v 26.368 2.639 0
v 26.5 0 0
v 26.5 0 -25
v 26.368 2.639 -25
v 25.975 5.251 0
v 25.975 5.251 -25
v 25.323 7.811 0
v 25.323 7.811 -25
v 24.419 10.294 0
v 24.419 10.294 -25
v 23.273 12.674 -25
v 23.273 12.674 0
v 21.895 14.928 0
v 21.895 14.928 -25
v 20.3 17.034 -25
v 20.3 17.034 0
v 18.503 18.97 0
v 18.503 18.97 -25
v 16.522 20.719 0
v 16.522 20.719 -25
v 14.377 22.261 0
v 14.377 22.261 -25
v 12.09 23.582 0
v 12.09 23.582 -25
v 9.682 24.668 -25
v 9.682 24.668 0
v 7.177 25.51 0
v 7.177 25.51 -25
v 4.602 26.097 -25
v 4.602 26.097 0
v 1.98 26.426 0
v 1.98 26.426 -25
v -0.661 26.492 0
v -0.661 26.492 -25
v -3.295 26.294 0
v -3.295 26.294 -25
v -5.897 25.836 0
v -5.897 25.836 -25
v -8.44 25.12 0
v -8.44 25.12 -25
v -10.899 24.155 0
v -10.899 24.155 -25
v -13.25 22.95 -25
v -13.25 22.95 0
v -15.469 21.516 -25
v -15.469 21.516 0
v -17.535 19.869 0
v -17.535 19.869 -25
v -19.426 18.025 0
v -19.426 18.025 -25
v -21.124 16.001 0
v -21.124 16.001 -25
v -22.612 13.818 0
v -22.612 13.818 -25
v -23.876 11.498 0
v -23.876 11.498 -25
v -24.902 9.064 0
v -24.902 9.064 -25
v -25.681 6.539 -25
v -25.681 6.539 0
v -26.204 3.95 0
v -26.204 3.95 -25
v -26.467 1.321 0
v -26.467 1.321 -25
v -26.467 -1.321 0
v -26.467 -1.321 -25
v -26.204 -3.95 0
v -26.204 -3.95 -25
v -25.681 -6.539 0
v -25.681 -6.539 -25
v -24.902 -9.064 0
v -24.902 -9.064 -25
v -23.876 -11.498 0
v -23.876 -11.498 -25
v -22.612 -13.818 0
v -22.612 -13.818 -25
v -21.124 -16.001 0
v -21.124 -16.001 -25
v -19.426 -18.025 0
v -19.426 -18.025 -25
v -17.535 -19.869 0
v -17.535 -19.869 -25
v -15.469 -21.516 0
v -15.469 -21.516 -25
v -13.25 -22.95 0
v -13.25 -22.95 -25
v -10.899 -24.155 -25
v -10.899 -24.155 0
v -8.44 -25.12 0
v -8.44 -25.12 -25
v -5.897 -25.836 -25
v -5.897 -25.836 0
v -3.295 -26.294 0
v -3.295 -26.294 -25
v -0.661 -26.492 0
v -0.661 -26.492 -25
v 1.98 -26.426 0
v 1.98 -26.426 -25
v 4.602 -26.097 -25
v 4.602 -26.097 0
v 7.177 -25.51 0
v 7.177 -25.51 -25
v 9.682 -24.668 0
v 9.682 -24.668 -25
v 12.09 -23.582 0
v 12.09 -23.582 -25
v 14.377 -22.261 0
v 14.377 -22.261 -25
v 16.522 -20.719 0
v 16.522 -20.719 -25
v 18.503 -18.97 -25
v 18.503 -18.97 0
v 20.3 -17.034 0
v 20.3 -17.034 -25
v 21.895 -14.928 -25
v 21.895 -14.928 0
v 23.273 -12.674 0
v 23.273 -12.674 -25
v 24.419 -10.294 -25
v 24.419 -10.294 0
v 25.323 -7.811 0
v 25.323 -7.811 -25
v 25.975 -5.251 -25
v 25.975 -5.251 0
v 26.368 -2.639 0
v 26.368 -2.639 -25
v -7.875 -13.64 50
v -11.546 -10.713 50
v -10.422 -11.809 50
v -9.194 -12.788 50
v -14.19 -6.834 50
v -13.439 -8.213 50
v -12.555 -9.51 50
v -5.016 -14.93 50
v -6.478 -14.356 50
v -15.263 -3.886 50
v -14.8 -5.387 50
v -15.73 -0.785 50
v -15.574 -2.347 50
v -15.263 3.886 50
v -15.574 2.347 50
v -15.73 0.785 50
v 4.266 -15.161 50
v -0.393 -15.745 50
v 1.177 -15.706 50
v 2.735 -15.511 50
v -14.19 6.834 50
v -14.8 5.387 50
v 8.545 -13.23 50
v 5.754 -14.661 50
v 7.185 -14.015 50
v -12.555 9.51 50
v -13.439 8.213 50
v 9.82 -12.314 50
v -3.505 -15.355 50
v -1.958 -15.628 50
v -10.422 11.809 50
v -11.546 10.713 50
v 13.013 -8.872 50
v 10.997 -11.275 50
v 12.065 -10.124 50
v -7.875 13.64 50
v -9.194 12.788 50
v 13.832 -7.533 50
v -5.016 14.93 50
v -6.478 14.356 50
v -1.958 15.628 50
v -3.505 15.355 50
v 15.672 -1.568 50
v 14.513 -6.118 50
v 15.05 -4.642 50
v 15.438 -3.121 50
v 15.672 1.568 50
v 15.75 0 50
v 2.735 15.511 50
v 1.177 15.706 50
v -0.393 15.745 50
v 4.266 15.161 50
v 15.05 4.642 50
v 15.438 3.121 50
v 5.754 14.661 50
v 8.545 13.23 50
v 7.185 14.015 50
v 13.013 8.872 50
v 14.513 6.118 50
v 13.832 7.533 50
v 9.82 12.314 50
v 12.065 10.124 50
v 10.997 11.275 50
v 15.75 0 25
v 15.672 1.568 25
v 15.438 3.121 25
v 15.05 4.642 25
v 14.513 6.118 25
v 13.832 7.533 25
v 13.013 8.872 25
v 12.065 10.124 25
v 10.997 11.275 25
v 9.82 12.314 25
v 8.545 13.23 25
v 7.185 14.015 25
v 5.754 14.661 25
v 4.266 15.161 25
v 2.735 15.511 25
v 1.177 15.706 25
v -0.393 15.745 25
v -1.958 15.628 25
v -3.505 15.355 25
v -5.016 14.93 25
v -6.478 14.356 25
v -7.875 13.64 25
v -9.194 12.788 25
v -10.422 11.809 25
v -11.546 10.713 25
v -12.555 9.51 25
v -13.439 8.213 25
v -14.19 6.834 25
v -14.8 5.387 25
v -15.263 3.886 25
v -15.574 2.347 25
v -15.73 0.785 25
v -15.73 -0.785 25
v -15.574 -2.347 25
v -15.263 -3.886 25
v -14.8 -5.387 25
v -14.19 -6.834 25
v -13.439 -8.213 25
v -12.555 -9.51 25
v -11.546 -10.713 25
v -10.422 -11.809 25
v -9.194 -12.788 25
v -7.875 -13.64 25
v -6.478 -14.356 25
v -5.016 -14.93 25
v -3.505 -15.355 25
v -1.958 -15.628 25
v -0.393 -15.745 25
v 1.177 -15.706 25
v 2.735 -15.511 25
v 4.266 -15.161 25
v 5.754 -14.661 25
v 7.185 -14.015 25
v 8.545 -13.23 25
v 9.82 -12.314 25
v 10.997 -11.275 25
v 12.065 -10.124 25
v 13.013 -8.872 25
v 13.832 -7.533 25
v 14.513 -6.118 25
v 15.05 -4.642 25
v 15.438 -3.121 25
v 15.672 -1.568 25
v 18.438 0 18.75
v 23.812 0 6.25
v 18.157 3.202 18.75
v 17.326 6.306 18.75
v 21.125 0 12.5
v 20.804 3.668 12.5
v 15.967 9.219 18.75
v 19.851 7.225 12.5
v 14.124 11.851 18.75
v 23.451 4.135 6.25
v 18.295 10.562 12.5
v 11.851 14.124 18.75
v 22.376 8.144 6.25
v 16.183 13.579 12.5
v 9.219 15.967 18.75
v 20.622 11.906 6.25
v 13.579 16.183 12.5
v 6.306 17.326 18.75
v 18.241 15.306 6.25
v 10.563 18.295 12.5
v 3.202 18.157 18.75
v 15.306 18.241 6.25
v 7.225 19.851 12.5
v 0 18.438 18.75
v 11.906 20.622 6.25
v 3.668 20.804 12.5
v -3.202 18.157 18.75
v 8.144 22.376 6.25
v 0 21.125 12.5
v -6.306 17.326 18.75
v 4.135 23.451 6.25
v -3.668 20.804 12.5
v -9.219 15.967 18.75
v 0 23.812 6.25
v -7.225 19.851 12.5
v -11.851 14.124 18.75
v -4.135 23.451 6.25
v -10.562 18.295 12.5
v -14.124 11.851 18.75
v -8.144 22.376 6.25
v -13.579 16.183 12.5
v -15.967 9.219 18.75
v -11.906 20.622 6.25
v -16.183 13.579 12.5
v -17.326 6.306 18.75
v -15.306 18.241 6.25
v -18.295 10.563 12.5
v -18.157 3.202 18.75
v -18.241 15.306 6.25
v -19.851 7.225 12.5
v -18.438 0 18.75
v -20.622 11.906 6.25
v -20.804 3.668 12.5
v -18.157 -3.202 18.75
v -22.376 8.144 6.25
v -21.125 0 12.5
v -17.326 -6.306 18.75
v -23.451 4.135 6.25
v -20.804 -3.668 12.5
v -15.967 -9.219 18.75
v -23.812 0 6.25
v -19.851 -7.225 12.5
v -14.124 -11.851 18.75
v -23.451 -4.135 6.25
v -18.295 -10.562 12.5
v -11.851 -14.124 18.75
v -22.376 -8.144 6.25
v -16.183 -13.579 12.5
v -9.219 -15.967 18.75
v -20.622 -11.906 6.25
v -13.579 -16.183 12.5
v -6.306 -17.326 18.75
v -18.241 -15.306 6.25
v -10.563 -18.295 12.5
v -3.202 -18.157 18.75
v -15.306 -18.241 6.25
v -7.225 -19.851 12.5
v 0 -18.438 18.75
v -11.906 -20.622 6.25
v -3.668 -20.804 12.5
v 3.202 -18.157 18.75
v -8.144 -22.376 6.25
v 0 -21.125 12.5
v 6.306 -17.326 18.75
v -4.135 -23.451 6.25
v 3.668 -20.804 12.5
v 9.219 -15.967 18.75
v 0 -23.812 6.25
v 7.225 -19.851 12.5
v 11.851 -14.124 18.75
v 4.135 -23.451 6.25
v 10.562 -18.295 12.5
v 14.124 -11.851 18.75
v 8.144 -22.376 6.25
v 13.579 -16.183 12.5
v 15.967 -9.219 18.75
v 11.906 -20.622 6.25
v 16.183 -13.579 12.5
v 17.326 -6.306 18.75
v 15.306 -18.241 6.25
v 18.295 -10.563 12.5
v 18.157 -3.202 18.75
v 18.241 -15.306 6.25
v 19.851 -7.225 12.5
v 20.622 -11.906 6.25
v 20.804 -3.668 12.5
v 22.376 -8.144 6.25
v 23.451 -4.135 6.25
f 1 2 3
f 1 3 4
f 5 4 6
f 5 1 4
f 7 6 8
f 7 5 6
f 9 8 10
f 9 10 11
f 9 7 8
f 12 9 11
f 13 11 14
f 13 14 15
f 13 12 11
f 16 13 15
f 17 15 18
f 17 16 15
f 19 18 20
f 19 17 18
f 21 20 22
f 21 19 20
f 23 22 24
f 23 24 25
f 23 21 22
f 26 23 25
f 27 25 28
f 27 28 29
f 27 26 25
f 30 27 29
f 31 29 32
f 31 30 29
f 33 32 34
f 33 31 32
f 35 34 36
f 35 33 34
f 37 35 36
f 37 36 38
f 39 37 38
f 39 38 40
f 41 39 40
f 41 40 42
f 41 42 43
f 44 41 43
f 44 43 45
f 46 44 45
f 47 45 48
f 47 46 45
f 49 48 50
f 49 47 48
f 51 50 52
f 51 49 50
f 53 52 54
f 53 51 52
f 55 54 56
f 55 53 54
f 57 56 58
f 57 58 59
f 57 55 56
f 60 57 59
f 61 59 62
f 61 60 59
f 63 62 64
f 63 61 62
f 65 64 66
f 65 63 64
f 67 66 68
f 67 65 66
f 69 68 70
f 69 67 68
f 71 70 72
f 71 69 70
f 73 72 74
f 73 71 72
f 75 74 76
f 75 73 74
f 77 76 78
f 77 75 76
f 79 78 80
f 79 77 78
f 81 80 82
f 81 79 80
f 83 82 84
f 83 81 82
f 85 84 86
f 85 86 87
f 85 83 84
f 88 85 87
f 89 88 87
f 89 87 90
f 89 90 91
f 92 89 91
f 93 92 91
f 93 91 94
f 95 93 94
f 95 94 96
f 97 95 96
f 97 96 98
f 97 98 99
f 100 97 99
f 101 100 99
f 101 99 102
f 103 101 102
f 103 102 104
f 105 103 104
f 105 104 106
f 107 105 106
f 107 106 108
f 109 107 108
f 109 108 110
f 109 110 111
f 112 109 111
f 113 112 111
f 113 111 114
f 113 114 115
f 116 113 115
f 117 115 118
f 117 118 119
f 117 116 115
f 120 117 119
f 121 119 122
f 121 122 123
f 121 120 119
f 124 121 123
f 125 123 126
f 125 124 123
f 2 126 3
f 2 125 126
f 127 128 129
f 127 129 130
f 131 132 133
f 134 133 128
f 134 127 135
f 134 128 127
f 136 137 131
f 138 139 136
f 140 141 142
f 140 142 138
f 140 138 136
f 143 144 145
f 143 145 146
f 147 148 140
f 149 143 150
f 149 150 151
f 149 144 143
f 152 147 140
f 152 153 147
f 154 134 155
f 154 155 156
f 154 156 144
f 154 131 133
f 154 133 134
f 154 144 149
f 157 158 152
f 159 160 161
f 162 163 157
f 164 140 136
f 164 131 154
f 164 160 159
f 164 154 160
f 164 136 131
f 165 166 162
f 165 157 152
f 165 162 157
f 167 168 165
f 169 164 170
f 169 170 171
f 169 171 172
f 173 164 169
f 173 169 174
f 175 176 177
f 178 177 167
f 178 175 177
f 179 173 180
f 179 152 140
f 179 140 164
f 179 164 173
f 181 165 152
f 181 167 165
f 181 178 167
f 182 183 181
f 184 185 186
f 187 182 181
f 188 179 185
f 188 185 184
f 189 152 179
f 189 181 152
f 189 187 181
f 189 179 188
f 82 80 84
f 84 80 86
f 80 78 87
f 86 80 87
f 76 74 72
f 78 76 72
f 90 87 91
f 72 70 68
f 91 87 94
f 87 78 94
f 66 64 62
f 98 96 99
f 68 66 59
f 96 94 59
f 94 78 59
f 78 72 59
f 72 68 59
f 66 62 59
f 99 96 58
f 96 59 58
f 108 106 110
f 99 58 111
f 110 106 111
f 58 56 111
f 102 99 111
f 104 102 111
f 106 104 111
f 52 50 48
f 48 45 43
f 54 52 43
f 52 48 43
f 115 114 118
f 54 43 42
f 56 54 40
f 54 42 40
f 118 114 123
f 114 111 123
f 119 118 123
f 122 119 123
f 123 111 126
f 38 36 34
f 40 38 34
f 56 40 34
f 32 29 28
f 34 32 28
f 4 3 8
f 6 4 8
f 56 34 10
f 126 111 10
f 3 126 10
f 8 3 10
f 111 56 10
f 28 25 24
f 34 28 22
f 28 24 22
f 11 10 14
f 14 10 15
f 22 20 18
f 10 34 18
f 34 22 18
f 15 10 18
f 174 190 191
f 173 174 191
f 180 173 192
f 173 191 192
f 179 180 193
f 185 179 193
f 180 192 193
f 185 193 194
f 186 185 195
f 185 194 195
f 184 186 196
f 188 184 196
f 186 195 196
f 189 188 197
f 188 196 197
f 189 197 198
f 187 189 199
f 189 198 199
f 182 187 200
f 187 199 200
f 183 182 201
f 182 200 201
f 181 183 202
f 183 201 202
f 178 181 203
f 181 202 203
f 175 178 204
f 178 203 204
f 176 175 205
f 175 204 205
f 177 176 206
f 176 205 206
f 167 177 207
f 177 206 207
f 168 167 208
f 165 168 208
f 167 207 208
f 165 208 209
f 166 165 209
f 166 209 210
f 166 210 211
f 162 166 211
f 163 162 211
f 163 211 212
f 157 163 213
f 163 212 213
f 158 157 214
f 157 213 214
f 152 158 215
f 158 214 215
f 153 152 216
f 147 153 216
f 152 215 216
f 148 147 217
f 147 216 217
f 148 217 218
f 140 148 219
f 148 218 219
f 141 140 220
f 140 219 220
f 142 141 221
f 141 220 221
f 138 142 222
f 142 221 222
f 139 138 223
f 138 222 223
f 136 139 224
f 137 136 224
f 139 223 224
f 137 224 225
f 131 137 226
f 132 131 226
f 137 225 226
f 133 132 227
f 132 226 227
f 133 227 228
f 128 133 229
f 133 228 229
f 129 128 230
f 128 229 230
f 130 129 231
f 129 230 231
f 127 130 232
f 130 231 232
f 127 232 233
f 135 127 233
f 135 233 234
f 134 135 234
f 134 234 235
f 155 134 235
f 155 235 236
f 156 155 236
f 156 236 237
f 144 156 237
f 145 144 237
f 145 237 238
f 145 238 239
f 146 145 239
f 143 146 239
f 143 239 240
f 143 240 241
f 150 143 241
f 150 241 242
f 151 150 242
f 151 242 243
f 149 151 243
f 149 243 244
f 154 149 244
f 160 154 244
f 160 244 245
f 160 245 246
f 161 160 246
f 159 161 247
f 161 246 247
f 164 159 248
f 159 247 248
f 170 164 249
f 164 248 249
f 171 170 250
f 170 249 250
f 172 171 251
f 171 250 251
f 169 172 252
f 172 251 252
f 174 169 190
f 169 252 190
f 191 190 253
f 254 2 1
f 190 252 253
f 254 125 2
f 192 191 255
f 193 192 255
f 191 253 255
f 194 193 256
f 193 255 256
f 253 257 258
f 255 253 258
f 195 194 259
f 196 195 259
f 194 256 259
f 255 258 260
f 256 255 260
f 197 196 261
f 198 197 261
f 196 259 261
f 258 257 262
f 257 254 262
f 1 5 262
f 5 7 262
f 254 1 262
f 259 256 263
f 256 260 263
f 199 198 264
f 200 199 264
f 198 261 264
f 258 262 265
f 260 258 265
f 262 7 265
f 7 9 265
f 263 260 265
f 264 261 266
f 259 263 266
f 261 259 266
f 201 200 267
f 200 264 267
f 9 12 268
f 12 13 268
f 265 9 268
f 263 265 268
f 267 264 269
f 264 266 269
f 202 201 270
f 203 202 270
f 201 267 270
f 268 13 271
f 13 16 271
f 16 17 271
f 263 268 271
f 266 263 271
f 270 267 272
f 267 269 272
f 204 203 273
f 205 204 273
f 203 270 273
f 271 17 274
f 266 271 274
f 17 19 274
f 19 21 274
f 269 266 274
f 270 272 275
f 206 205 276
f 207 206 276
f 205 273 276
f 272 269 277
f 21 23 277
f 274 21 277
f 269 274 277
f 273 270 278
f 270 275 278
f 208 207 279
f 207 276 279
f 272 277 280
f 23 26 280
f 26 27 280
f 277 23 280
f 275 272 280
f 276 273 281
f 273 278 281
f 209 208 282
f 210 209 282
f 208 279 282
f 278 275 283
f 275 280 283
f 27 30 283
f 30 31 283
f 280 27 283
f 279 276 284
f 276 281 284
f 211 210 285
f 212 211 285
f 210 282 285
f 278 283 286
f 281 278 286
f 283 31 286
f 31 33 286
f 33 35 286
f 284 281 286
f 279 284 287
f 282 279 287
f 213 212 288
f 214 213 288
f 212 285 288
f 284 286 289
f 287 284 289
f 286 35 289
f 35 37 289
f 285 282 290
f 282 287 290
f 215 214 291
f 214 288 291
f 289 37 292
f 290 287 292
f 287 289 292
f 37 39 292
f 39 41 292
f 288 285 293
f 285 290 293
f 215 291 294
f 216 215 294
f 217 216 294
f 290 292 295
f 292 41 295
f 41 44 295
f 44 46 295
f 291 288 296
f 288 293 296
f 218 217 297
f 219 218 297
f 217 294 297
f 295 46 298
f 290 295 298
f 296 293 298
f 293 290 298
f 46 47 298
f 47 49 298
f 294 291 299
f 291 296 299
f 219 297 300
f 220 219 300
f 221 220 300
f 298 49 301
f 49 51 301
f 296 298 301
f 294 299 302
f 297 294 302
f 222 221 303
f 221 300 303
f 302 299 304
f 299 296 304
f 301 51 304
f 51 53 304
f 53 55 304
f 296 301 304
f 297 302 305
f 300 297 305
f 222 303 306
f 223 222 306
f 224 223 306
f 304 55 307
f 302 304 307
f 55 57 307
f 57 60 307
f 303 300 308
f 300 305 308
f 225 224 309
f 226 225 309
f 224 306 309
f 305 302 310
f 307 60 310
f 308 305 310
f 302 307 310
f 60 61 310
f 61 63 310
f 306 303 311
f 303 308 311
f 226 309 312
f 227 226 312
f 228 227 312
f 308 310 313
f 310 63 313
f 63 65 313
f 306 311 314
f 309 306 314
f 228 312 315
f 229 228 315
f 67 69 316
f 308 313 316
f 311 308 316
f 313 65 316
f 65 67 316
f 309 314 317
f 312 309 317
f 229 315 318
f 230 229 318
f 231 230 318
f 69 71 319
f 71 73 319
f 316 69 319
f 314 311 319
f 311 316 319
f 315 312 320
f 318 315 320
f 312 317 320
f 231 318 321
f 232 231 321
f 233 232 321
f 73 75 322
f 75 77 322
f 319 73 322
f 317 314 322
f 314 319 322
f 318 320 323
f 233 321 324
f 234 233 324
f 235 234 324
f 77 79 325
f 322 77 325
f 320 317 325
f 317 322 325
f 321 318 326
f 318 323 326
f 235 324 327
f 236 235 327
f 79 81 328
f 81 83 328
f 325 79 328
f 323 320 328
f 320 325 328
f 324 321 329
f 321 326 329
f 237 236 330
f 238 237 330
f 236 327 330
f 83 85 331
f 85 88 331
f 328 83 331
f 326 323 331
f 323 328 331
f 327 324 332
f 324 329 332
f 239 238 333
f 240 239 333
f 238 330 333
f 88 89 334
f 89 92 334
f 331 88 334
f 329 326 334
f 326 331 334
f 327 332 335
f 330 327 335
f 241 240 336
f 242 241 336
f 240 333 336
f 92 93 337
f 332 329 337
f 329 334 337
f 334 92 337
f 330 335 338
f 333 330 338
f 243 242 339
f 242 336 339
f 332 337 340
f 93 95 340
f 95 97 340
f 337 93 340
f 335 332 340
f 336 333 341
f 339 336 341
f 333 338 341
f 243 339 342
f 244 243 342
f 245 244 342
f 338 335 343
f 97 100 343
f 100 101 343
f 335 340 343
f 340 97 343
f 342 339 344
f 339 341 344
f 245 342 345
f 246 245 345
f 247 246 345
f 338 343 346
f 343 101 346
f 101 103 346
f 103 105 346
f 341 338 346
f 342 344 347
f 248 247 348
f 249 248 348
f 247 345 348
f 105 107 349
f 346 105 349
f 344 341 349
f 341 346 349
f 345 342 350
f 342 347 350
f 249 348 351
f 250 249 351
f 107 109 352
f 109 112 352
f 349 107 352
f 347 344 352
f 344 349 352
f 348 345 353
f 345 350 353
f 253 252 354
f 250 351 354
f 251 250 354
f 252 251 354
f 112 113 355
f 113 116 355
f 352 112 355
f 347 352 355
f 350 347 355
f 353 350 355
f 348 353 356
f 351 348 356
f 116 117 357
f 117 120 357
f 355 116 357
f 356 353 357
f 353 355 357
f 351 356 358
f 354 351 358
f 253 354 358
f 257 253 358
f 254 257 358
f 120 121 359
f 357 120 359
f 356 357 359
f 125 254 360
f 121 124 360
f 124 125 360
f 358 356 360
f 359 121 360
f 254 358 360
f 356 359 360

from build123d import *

# Parameters (mm, degrees)
F2_R     = 15.75
F0_R     = 26.5
F4_DEPTH = 25
F5_DEPTH = 25


with BuildPart() as f3:
    # F2 (on offset) → F3 section 0
    with BuildSketch(Plane.XY.offset(25)):
        Circle(F2_R)
    # F0 (on Top) → F3 section 1
    with BuildSketch(Plane.XY):
        Circle(F0_R)
    loft()

    # F4 (add): a face of the model
    f4_faces = [f3.faces().sort_by_distance(p)[0] for p in [
        (0, 0, 25),
    ]]
    extrude(f4_faces, amount=F4_DEPTH)

    # F5 (add): a face of the model
    f5_faces = [f3.faces().sort_by_distance(p)[0] for p in [
        (0, 0, 0),
    ]]
    extrude(f5_faces, amount=F5_DEPTH)


solid = f3.part
